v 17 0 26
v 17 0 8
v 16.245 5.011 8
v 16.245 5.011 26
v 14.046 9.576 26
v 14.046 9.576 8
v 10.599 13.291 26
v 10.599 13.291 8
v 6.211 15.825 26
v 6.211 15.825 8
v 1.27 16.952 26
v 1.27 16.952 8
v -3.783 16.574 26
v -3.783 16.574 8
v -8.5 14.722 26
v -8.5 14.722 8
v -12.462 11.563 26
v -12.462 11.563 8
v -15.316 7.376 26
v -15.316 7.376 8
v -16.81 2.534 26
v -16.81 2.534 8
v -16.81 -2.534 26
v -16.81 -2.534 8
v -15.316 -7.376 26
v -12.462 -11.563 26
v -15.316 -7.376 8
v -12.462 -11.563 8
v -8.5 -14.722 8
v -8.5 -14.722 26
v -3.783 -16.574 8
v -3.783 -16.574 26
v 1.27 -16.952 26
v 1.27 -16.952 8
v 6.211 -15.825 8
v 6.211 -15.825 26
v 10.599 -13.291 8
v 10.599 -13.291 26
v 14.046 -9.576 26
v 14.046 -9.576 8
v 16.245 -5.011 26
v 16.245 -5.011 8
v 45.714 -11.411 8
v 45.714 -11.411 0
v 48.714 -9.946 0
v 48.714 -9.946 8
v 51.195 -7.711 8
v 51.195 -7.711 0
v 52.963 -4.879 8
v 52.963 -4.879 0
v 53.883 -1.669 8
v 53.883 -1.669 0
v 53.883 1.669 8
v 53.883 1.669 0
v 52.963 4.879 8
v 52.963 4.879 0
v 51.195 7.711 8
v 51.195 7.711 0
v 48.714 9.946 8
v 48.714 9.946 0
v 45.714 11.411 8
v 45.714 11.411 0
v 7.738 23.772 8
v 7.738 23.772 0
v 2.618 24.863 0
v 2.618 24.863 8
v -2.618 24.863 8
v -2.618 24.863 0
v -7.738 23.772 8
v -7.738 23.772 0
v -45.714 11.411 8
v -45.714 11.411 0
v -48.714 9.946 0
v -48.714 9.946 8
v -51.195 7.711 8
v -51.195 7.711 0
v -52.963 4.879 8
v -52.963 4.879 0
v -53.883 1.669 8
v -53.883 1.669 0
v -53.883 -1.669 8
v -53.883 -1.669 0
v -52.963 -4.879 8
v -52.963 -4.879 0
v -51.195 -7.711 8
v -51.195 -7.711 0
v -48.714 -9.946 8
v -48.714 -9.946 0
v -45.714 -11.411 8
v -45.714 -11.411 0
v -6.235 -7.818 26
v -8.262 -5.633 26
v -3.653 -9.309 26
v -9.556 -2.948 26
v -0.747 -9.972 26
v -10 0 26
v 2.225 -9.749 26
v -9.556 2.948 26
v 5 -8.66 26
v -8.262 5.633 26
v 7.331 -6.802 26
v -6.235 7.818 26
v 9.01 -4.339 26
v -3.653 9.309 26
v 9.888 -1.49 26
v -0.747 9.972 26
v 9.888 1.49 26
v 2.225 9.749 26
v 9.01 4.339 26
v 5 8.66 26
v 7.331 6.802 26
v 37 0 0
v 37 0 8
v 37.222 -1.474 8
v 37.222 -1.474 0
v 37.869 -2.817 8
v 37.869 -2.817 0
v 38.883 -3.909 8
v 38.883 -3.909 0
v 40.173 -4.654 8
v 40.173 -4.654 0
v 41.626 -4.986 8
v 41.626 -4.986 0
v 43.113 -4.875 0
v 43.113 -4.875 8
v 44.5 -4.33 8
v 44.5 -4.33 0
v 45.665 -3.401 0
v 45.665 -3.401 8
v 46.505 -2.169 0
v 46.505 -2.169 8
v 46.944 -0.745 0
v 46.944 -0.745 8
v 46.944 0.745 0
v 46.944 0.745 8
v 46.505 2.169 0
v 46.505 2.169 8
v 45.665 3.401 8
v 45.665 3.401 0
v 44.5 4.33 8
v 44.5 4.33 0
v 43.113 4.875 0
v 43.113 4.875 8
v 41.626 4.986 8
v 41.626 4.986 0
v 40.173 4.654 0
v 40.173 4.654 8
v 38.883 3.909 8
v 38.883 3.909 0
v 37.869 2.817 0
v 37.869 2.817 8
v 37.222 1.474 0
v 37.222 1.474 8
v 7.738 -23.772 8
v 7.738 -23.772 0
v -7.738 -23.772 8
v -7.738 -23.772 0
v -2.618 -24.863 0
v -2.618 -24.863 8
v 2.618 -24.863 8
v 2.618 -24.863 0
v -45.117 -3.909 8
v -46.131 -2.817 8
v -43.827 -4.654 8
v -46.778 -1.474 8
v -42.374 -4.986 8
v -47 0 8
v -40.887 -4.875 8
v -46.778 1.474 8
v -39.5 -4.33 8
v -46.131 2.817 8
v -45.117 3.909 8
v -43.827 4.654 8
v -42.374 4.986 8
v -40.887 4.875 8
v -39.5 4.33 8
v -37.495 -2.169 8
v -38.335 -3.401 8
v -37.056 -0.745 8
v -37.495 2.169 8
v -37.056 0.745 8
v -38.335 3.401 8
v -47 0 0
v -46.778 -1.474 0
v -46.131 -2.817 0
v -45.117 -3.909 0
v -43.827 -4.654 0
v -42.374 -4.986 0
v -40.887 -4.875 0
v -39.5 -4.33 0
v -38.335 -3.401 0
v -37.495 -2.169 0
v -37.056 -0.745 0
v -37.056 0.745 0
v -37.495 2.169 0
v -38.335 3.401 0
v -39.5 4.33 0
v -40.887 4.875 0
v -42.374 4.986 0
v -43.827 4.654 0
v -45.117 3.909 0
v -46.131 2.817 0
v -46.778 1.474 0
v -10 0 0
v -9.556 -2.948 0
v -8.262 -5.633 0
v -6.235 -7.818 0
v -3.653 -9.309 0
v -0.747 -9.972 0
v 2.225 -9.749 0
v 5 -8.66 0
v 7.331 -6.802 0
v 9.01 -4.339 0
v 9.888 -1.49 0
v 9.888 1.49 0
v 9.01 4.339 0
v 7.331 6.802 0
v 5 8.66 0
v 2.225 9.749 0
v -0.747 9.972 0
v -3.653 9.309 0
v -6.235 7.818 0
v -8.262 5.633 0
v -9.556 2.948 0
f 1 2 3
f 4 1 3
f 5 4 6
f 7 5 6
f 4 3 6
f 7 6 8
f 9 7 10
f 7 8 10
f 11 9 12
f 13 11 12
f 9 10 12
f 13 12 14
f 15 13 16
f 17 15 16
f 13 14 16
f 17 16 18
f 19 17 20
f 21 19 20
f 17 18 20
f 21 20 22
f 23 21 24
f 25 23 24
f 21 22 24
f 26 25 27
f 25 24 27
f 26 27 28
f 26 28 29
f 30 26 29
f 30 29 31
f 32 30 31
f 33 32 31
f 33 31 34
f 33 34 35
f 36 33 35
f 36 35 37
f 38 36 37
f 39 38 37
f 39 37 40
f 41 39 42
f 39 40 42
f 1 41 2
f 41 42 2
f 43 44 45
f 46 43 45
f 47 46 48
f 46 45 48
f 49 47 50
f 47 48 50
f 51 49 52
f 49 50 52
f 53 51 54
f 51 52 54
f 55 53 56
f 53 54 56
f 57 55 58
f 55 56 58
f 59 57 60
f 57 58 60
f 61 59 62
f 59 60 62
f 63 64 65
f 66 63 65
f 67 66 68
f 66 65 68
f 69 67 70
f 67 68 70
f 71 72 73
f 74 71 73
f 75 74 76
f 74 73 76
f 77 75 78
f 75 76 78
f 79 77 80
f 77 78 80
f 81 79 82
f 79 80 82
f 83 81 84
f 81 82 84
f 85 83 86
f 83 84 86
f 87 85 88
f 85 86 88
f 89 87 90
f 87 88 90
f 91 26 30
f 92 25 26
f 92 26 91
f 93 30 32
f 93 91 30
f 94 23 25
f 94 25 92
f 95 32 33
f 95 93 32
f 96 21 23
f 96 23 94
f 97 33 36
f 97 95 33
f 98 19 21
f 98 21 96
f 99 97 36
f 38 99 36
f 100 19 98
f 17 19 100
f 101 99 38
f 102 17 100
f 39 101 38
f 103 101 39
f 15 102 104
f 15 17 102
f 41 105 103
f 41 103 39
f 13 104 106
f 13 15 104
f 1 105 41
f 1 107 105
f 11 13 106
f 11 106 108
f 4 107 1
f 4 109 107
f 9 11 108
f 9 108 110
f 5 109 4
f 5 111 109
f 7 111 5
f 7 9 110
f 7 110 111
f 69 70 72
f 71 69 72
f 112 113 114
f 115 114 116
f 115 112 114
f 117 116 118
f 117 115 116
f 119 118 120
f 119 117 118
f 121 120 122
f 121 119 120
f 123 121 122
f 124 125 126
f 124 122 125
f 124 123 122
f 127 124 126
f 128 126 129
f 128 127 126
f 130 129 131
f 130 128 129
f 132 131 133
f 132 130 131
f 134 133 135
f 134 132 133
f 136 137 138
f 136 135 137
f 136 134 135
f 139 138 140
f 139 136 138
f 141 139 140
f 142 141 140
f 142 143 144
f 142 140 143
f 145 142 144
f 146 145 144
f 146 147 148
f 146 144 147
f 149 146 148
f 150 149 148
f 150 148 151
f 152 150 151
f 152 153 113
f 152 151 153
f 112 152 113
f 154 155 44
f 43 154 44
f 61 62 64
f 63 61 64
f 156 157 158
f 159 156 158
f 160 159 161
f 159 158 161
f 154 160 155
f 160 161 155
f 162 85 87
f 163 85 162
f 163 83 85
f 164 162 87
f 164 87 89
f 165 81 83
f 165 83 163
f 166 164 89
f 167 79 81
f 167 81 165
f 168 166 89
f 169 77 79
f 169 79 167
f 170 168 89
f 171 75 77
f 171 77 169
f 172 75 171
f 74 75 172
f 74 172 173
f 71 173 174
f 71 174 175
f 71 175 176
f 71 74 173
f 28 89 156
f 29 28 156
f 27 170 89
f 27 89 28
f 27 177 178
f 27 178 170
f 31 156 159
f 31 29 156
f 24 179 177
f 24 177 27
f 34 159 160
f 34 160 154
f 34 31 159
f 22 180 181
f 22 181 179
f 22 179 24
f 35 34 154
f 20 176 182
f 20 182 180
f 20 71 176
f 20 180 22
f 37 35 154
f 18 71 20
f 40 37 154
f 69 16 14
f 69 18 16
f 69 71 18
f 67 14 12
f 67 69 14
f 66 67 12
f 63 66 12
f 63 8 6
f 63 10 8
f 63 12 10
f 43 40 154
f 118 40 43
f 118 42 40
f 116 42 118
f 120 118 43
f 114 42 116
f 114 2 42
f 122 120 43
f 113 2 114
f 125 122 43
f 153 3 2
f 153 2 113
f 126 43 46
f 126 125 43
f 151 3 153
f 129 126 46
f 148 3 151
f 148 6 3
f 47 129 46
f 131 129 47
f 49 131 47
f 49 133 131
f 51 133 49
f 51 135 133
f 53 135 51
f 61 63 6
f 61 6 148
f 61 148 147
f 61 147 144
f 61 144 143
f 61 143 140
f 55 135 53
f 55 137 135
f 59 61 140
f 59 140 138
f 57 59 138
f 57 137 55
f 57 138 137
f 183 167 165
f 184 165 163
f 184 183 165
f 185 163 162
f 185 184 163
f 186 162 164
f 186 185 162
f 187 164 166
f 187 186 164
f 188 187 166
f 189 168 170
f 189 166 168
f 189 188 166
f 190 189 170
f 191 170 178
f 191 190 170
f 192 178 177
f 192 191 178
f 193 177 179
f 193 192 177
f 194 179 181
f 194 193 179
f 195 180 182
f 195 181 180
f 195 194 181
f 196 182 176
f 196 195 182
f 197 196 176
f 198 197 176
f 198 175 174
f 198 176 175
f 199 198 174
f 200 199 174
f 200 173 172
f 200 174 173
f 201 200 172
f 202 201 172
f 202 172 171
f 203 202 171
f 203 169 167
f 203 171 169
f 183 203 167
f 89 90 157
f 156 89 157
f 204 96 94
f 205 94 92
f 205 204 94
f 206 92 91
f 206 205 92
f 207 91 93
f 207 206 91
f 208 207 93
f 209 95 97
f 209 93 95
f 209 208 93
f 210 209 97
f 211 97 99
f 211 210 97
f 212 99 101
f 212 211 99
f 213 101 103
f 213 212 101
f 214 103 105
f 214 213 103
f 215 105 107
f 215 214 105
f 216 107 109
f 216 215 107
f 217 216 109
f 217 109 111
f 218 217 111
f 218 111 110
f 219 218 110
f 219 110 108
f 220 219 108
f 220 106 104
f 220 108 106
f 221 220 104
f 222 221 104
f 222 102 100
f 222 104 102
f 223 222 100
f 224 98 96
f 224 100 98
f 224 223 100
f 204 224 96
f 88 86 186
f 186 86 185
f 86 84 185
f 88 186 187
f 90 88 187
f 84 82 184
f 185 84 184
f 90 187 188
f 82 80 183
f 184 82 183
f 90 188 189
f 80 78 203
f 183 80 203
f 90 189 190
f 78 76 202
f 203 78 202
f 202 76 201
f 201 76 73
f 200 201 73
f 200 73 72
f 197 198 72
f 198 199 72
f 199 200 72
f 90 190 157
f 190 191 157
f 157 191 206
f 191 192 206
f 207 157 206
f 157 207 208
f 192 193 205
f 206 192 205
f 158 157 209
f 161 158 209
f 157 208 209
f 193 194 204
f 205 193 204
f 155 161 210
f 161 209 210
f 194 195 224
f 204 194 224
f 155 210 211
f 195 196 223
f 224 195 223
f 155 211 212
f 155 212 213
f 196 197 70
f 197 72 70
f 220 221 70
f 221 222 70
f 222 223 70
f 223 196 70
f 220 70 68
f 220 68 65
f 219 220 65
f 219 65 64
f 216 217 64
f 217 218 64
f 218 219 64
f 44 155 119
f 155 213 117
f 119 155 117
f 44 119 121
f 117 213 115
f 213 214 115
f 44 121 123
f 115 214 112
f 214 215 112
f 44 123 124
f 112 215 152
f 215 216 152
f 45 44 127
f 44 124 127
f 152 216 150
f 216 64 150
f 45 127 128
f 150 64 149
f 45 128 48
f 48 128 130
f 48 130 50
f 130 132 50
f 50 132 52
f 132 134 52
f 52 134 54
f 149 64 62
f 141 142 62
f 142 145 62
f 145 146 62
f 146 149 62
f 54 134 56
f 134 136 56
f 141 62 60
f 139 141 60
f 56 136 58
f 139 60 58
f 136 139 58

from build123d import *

# Parameters (mm, degrees)
EXTRUDE_1_DEPTH     = 8
SKETCH_2_R          = 17
EXTRUDE_2_DEPTH     = 18
SKETCH_3_R          = 10
CUT_EXTRUDE_1_DEPTH = 65.93843238
SKETCH_4_R          = 5
CUT_EXTRUDE_2_DEPTH = 65.93843238


with BuildPart() as part:
    # 草图1 → 凸台-拉伸1 (new body)
    with BuildSketch(Plane.XY):
        with BuildLine():
            Line((-7.738095, 23.7723), (-45.714286, 11.410704))
            ThreePointArc((-45.714286, 11.410704), (-54, 0), (-45.714286, -11.410704))
            Line((-45.714286, -11.410704), (-7.738095, -23.7723))
            ThreePointArc((-7.738095, -23.7723), (0, -25), (7.738095, -23.7723))
            Line((7.738095, -23.7723), (45.714286, -11.410704))
            ThreePointArc((45.714286, -11.410704), (54, 0), (45.714286, 11.410704))
            Line((45.714286, 11.410704), (7.738095, 23.7723))
            ThreePointArc((7.738095, 23.7723), (0, 25), (-7.738095, 23.7723))
        make_face()
    extrude(amount=EXTRUDE_1_DEPTH)

    # 草图2 → 凸台-拉伸2 (add)
    with BuildSketch(Plane.XY.offset(8)):
        Circle(SKETCH_2_R)
    extrude(amount=EXTRUDE_2_DEPTH)

    # 草图3 → 切除-拉伸1 (cut, through all)
    with BuildSketch(Plane.XY):
        with Locations(Location((0, 0, 0), (0, 0, 180))):
            Circle(SKETCH_3_R)
    extrude(amount=CUT_EXTRUDE_1_DEPTH, mode=Mode.SUBTRACT)

    # 草图4 → 切除-拉伸2 (cut, through all)
    with BuildSketch(Plane.XY):
        with Locations(Location((42, 0, 0), (0, 0, 180))):
            Circle(SKETCH_4_R)
        with Locations(Location((-42, 0, 0), (0, 0, 180))):
            Circle(SKETCH_4_R)
    extrude(amount=CUT_EXTRUDE_2_DEPTH, mode=Mode.SUBTRACT)


solid = part.part
